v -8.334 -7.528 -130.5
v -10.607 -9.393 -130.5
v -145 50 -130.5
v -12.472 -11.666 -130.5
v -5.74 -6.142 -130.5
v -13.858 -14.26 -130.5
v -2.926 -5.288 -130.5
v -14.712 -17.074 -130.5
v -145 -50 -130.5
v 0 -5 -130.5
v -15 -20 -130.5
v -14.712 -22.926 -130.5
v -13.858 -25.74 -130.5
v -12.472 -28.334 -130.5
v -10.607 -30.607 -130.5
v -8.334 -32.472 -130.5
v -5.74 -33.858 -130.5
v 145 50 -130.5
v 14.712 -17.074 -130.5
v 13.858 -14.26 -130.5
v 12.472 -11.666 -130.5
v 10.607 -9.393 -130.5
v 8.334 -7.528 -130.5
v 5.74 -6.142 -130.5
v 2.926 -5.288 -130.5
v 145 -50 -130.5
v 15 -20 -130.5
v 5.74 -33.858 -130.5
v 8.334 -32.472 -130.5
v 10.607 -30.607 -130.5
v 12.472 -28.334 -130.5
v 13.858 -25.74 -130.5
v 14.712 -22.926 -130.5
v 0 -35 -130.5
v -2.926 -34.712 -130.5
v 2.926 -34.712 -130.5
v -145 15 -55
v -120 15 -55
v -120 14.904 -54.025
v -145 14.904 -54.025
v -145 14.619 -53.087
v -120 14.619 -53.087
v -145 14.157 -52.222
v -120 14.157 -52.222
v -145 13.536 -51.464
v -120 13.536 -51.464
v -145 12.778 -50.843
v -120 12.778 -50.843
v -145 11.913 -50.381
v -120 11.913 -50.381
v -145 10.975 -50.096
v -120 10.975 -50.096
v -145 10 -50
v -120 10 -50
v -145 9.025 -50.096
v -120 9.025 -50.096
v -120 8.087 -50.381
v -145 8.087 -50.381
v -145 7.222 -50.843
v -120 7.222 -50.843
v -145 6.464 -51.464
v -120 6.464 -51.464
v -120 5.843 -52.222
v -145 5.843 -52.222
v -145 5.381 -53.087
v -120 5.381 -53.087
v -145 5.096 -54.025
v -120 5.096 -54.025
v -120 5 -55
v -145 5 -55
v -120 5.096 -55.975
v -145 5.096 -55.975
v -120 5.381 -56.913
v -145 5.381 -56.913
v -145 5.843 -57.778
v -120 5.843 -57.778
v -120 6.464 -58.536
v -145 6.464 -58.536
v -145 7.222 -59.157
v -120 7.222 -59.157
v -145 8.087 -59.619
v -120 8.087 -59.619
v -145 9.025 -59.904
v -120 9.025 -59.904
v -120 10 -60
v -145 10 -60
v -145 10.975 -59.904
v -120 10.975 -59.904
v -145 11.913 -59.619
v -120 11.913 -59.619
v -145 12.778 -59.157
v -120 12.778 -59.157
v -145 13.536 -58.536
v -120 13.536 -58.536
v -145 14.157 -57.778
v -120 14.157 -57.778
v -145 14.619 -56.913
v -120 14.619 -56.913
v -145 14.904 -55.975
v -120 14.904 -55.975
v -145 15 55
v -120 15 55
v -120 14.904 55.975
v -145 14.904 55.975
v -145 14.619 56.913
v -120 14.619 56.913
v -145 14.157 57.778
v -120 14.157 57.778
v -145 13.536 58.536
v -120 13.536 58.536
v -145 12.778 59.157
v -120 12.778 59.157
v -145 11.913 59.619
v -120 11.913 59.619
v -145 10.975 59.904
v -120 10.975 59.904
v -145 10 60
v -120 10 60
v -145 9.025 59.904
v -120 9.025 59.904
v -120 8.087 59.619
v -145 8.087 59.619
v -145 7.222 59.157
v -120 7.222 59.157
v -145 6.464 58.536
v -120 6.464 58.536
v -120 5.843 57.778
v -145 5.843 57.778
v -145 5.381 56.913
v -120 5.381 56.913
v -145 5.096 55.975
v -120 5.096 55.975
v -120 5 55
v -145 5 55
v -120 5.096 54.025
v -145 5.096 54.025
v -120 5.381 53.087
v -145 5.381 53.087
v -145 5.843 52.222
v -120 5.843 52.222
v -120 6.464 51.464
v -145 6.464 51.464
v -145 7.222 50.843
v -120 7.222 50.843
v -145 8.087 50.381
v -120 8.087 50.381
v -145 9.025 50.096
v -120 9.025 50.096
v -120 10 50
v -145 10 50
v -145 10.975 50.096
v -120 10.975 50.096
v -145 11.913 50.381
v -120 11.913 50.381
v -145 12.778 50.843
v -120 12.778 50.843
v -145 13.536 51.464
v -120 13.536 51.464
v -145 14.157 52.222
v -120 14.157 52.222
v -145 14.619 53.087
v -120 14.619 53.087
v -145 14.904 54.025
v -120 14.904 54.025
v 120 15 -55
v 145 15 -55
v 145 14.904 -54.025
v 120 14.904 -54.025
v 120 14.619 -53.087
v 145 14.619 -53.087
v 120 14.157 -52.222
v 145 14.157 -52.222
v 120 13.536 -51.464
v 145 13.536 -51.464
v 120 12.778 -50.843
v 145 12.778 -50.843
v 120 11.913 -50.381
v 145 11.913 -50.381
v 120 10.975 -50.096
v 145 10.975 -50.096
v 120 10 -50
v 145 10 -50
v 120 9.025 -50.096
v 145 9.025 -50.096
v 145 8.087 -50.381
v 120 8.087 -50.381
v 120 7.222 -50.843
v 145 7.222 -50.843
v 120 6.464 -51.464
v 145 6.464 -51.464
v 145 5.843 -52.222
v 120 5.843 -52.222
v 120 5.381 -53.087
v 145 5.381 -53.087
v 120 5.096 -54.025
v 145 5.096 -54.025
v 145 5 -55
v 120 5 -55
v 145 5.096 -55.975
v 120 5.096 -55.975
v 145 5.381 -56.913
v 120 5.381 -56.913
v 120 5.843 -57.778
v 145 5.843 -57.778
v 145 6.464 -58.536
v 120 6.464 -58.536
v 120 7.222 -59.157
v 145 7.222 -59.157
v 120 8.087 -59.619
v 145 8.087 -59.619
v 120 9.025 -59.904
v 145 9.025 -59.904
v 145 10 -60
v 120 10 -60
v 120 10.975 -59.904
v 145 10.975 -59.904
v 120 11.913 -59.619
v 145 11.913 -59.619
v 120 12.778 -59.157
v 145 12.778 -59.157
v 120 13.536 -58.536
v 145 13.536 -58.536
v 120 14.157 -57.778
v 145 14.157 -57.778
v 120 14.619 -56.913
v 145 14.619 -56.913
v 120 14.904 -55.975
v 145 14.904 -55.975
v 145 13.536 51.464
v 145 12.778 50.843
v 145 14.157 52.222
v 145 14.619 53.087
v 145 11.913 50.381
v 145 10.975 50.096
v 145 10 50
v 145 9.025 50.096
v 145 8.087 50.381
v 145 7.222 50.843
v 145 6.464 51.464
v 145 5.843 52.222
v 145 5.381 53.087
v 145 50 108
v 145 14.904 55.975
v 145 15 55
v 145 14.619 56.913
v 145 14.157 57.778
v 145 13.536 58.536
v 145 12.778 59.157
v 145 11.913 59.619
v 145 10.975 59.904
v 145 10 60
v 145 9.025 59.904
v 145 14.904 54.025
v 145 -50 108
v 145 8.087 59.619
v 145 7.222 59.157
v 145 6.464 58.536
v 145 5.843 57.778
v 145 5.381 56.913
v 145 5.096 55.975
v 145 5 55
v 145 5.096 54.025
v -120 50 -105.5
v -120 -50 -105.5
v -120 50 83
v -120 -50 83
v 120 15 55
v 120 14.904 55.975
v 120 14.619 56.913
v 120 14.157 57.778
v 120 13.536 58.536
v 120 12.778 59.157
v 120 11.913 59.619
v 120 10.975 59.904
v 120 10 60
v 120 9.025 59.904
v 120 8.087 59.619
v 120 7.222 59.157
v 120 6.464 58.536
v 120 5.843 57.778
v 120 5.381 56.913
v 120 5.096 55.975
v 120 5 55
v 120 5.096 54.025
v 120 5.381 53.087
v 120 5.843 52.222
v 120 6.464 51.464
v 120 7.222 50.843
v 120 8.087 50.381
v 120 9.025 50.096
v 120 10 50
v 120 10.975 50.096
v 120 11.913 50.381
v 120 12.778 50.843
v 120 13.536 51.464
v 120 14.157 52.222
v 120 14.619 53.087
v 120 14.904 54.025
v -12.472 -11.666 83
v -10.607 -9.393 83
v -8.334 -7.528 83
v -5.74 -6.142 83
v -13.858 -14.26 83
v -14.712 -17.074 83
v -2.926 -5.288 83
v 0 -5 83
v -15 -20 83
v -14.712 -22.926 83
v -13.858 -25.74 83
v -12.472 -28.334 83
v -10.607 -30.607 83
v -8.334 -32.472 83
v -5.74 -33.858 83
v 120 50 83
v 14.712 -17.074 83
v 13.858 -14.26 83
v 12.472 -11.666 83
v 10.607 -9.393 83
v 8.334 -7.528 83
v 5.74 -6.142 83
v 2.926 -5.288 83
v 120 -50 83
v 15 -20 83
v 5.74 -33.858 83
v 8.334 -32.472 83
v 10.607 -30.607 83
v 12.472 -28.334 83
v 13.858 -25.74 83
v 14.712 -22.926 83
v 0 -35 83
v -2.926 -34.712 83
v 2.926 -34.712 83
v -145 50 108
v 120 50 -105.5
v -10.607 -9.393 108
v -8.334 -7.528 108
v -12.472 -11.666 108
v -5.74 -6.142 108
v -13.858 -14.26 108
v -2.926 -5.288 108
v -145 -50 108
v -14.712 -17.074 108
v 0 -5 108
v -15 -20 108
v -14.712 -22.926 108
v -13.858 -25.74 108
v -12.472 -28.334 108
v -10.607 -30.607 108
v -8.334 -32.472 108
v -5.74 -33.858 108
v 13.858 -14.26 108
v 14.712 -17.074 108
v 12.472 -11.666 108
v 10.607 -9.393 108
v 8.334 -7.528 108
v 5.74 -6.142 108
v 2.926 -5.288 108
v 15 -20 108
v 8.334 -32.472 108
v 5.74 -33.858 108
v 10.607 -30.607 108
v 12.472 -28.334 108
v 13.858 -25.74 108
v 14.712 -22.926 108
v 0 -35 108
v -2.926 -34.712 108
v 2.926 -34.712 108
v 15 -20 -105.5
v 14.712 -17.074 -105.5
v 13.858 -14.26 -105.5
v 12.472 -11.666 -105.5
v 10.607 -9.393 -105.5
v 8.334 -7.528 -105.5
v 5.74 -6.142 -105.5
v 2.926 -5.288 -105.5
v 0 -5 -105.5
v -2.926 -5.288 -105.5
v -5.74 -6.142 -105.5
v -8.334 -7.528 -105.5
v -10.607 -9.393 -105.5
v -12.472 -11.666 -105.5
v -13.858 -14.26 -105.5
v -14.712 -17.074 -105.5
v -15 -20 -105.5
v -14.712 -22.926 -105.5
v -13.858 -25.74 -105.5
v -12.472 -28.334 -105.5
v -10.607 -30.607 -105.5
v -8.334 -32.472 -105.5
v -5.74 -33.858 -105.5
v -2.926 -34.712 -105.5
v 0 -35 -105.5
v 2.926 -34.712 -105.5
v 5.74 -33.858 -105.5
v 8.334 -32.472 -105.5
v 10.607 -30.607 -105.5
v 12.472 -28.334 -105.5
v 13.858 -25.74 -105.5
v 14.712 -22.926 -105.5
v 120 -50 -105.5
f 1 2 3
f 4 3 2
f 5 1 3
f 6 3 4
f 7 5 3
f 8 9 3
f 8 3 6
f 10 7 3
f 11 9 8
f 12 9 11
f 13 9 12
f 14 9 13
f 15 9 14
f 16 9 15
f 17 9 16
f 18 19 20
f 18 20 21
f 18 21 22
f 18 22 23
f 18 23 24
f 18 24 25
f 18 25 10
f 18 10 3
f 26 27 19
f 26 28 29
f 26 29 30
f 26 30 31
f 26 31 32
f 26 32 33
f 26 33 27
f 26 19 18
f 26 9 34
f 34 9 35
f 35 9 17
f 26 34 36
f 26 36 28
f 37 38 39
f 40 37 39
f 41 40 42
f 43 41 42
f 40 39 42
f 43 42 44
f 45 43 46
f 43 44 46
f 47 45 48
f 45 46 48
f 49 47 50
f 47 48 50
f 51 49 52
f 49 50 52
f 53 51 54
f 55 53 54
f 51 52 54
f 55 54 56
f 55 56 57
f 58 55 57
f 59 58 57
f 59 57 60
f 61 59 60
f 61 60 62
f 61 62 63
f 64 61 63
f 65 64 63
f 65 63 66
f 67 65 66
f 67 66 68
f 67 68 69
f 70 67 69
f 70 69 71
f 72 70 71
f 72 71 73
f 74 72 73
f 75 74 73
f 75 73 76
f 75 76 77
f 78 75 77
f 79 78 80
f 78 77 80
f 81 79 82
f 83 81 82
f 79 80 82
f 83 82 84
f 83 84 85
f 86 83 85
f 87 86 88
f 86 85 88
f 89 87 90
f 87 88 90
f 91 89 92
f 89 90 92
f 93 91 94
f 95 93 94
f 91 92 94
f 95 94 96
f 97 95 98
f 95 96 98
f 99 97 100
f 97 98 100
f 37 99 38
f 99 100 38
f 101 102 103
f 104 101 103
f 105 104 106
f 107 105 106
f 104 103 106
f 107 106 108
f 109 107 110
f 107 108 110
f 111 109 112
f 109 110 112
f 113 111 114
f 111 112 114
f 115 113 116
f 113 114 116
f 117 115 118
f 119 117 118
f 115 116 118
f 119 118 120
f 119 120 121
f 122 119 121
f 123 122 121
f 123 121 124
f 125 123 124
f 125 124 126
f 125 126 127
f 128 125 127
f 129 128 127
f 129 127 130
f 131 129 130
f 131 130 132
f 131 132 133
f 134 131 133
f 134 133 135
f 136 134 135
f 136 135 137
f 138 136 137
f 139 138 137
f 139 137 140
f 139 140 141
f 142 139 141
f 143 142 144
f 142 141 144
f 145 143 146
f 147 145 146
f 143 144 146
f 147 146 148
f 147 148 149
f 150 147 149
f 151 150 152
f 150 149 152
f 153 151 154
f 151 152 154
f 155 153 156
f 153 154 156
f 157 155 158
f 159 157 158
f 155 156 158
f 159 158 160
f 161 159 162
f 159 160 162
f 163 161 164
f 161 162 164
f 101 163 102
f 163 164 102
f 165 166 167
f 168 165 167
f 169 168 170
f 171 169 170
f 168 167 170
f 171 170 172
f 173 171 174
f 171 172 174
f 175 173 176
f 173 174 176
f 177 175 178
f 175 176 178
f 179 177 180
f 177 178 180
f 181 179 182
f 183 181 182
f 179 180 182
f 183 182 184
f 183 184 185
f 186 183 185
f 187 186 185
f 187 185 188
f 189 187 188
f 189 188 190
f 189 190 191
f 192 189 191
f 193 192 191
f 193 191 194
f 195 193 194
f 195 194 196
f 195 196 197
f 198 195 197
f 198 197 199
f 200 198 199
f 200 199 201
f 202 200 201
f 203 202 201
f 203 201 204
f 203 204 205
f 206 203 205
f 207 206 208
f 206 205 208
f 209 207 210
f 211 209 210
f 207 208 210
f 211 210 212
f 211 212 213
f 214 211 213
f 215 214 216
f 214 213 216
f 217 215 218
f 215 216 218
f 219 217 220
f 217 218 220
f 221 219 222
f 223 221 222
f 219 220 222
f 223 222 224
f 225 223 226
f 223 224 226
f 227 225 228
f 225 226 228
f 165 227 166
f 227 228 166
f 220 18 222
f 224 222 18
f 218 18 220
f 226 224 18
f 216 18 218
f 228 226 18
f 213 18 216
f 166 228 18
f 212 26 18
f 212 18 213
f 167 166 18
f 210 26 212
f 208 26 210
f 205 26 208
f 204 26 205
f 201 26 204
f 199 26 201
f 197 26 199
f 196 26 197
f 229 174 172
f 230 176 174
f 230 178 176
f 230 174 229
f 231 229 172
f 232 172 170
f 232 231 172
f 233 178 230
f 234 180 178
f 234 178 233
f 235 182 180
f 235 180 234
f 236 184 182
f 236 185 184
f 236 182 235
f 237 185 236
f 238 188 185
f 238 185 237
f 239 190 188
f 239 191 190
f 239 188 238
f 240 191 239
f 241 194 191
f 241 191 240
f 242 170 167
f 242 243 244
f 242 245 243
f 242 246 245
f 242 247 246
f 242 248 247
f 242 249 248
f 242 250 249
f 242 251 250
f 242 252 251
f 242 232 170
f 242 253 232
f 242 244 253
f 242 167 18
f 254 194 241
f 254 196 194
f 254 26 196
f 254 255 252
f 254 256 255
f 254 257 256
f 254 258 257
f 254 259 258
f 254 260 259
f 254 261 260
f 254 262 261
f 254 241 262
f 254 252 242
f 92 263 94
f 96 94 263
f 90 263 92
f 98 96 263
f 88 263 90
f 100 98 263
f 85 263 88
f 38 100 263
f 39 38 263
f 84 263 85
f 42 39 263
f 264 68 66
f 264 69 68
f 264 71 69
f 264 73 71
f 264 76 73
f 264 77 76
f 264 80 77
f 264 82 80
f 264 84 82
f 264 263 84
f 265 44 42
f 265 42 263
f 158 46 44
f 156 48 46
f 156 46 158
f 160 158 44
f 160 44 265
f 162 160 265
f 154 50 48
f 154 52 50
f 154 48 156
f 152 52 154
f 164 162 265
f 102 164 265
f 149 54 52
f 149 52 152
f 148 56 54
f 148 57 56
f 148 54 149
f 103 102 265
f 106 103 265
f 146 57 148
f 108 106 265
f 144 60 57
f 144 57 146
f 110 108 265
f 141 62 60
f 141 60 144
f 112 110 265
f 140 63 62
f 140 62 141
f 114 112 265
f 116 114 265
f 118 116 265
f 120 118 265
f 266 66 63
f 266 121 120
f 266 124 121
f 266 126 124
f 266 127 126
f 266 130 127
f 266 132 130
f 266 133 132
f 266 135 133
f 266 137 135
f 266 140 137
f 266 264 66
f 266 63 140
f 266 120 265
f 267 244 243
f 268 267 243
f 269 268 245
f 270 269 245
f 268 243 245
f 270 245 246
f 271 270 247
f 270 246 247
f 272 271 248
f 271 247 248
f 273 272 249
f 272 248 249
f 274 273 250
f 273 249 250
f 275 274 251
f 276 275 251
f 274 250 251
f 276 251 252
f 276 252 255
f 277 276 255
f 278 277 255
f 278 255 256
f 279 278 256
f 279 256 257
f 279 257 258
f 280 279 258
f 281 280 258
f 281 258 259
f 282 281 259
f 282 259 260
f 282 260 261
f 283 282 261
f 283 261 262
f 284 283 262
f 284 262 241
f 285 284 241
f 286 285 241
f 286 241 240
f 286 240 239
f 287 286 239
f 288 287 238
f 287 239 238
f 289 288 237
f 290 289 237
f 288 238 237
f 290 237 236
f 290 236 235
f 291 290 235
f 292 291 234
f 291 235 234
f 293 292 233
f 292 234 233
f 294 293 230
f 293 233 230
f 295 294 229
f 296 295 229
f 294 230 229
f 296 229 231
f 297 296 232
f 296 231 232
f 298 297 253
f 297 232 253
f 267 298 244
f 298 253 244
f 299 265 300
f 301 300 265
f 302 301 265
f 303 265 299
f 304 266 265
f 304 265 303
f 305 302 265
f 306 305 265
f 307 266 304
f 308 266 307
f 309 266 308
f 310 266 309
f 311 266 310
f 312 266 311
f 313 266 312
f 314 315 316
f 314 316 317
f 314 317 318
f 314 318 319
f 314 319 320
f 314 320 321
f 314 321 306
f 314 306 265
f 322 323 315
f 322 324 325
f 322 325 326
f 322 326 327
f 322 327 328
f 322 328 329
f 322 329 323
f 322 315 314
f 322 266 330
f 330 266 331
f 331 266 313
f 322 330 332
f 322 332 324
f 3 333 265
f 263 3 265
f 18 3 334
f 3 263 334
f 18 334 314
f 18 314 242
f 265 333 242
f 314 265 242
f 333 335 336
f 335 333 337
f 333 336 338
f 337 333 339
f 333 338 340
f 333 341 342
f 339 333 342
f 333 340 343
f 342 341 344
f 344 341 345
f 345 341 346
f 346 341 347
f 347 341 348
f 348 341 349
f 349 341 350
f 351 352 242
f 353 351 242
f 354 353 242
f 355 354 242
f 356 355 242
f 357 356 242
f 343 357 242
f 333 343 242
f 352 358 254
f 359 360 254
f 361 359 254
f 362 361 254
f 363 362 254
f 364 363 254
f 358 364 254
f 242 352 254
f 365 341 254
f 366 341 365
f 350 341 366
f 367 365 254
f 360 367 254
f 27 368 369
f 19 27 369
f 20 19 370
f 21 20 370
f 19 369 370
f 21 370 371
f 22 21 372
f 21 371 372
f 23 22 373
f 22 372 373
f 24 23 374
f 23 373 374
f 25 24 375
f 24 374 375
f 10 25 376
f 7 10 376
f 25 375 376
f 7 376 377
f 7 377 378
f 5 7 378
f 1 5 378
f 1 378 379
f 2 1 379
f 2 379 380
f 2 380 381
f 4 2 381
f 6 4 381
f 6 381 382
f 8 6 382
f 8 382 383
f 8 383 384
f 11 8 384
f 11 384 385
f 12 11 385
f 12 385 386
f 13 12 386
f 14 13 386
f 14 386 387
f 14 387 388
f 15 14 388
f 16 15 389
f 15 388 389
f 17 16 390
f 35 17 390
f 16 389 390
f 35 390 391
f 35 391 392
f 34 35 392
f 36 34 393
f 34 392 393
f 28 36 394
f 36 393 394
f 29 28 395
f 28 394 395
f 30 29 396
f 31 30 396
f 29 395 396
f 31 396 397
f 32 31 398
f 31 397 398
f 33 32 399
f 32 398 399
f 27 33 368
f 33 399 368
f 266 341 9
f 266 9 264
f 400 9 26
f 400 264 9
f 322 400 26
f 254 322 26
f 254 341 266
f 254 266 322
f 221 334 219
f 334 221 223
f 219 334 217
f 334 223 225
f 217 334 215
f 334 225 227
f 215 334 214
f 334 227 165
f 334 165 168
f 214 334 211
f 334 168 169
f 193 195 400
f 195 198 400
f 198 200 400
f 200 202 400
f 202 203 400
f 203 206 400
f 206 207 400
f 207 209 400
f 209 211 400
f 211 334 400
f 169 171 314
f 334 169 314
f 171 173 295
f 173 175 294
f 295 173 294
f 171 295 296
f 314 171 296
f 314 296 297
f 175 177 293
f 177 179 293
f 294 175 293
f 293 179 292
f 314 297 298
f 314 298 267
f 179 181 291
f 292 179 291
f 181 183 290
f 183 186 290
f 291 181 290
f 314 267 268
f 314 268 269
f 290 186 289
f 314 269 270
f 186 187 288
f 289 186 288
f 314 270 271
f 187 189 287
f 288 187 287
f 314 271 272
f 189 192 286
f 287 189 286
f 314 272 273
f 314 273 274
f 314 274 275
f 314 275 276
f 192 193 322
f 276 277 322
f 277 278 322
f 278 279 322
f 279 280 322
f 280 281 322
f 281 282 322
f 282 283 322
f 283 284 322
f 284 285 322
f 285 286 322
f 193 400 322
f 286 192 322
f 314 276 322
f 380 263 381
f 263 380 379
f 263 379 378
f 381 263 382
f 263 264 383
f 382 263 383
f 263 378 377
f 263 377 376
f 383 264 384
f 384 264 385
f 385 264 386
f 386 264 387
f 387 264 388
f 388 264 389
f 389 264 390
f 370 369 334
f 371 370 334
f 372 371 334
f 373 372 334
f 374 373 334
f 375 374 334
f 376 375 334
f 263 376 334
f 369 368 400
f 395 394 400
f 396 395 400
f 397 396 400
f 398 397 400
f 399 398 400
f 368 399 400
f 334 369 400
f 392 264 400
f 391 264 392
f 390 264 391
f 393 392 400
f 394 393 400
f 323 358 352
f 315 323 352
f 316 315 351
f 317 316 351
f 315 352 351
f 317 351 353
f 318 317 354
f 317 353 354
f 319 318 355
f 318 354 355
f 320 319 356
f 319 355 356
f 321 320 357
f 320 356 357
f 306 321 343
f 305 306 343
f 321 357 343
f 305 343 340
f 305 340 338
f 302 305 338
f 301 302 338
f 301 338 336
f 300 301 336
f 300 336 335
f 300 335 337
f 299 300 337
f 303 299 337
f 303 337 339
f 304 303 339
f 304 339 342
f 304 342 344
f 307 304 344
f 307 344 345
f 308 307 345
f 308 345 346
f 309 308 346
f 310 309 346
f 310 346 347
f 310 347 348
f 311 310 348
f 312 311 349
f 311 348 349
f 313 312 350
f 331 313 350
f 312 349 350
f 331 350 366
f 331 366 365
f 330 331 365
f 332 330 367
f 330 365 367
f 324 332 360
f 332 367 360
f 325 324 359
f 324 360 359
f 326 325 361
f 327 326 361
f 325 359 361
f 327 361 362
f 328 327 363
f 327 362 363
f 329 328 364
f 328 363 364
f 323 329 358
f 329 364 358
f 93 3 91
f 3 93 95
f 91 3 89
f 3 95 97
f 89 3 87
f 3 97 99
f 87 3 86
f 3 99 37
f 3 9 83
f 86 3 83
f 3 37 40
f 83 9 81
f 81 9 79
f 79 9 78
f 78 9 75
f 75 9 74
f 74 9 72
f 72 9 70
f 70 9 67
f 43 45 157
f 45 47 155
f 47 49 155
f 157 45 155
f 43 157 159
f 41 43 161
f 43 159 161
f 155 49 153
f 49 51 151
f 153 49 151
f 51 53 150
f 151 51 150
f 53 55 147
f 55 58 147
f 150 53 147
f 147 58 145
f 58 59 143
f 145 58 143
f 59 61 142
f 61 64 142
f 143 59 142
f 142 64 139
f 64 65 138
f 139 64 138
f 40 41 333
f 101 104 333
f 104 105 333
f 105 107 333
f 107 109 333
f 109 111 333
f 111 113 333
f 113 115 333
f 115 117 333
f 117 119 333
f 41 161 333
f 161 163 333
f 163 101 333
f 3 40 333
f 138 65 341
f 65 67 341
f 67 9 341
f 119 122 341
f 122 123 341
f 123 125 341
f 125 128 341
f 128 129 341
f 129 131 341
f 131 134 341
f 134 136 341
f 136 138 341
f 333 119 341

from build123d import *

# Parameters (mm, degrees)
F0_W     = 290
F0_H     = 238.5
F0_W_2   = 240
F0_H_2   = 188.5
F1_DEPTH = 50
F2_R     = 15
F3_DEPTH = 238.501
F4_R     = 5
F5_DEPTH = 290.001


with BuildPart() as f1:
    # F0 (on Front) → F1 (new body, symmetric)
    with BuildSketch(Plane.XZ):
        with Locations((0, -11.25)):
            Rectangle(F0_W, F0_H)
        with Locations((0, -11.25)):
            Rectangle(F0_W_2, F0_H_2, mode=Mode.SUBTRACT)
    extrude(amount=F1_DEPTH, both=True)

    # F2 (on face) → F3 (cut, through all)
    with BuildSketch(Plane.XY.offset(108)):
        with Locations((0, -20)):
            Circle(F2_R)
    extrude(amount=-F3_DEPTH, mode=Mode.SUBTRACT)

    # F4 (on face) → F5 (cut, through all)
    with BuildSketch(Plane.YZ.offset(145)):
        with Locations((10, 55)):
            Circle(F4_R)
        with Locations((10, -55)):
            Circle(F4_R)
    extrude(amount=-F5_DEPTH, mode=Mode.SUBTRACT)


solid = f1.part
